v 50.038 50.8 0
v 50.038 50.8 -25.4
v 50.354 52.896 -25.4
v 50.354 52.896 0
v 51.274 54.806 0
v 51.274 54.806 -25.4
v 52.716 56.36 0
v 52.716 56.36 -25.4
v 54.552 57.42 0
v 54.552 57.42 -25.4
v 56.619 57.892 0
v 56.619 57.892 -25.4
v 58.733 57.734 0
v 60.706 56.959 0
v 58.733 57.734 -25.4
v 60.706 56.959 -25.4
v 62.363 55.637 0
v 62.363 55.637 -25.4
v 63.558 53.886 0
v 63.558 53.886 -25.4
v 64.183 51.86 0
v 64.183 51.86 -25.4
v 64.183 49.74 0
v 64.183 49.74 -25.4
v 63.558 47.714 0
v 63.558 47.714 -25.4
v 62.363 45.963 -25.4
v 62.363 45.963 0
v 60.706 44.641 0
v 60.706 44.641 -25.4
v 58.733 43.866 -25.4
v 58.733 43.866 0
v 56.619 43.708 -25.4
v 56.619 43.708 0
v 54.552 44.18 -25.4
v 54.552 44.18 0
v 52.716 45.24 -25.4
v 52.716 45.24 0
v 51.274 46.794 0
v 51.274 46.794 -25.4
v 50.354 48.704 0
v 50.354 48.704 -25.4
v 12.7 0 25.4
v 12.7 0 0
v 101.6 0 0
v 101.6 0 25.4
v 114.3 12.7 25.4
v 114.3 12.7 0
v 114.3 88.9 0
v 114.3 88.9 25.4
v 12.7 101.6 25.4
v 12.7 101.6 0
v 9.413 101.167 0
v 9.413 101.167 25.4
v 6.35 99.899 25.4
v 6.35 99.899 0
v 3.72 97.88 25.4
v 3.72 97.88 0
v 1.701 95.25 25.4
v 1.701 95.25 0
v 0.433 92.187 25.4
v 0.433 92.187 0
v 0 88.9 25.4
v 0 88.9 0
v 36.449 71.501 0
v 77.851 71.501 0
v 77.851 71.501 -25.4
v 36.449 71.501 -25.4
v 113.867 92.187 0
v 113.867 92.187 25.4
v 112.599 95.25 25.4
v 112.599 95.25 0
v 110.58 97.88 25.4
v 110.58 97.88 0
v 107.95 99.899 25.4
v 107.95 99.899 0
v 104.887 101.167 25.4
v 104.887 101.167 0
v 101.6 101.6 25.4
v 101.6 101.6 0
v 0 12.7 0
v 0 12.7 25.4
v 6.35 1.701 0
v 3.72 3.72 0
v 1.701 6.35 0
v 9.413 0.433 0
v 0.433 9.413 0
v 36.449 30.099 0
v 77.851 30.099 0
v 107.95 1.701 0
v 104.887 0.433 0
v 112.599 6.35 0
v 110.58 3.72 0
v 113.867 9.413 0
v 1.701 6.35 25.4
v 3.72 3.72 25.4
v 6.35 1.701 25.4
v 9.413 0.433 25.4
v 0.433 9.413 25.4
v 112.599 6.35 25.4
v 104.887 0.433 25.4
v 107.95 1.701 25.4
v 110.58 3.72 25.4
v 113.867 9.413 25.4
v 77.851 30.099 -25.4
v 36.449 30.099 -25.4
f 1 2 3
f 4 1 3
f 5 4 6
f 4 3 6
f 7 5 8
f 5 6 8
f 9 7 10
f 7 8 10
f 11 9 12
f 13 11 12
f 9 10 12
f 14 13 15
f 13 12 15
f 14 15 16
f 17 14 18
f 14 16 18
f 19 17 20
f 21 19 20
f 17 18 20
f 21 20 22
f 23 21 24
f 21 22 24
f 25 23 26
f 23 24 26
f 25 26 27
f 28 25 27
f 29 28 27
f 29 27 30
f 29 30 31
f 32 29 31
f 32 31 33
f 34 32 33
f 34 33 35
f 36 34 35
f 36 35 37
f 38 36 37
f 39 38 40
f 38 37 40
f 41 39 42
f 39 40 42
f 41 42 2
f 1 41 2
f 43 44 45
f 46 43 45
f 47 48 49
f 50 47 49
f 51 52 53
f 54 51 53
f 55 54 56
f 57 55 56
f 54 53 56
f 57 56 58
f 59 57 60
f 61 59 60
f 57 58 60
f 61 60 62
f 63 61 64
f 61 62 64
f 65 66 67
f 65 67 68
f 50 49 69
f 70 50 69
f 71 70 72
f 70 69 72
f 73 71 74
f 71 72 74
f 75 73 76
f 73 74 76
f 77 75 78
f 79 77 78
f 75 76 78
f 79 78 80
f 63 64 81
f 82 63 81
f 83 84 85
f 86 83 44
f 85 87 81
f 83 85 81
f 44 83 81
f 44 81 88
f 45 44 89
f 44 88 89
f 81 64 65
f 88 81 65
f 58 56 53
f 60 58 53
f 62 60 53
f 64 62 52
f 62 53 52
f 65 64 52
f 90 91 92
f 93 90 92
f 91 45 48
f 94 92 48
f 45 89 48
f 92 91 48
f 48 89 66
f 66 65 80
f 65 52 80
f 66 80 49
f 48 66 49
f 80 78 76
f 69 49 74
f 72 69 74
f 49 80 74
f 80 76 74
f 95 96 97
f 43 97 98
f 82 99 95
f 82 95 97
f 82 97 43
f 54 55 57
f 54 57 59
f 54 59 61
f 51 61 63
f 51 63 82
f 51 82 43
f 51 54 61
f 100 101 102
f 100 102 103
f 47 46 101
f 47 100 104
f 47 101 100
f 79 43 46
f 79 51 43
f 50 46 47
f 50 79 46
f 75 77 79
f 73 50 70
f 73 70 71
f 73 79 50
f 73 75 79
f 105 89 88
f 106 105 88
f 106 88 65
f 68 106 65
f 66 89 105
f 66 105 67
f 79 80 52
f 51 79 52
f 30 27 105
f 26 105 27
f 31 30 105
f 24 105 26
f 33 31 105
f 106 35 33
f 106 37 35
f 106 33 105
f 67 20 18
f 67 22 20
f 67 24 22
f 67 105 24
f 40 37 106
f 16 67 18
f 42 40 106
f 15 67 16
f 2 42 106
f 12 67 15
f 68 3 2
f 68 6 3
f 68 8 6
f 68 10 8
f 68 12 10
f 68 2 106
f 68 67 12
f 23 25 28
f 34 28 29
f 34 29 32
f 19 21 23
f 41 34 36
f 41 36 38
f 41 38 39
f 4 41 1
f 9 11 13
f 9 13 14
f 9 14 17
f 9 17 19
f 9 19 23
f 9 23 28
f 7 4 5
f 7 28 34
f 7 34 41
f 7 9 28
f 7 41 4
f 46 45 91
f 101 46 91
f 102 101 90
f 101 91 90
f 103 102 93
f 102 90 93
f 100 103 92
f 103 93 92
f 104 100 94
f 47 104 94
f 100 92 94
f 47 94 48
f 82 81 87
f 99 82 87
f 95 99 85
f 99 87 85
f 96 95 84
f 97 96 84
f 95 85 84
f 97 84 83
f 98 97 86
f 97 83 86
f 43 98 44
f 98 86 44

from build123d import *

# Parameters (mm, degrees)
EXTRUDE_1_DEPTH     = 25.4
SKETCH_2_W          = 41.402
SKETCH_2_H          = 41.402
EXTRUDE_2_DEPTH     = 25.4
SKETCH_3_R          = 7.112
CUT_EXTRUDE_1_DEPTH = 25.4


with BuildPart() as part:
    # 草图1 → 凸台-拉伸1 (new body)
    with BuildSketch(Plane.XY):
        with BuildLine():
            Line((12.7, 0), (101.6, 0))
            ThreePointArc((101.6, 0), (110.580256121, 3.719743879), (114.3, 12.7))
            Line((114.3, 12.7), (114.3, 88.9))
            ThreePointArc((114.3, 88.9), (110.580256121, 97.880256121), (101.6, 101.6))
            Line((101.6, 101.6), (12.7, 101.6))
            ThreePointArc((12.7, 101.6), (3.719743879, 97.880256121), (0, 88.9))
            Line((0, 88.9), (0, 12.7))
            ThreePointArc((0, 12.7), (3.719743879, 3.719743879), (12.7, 0))
        make_face()
    extrude(amount=EXTRUDE_1_DEPTH)

    # 草图2 → 凸台-拉伸2 (add)
    with BuildSketch(Plane(origin=(0, 0, 0), x_dir=(-1, 0, 0), z_dir=(0, 0, -1))):
        with Locations((-57.15, 50.8)):
            Rectangle(SKETCH_2_W, SKETCH_2_H)
    extrude(amount=EXTRUDE_2_DEPTH)

    # 草图3 → 切除-拉伸1 (cut)
    with BuildSketch(Plane(origin=(0, 0, -25.4), x_dir=(-1, 0, 0), z_dir=(0, 0, -1))):
        with Locations((-57.15, 50.8)):
            Circle(SKETCH_3_R)
    extrude(amount=-CUT_EXTRUDE_1_DEPTH, mode=Mode.SUBTRACT)


solid = part.part
